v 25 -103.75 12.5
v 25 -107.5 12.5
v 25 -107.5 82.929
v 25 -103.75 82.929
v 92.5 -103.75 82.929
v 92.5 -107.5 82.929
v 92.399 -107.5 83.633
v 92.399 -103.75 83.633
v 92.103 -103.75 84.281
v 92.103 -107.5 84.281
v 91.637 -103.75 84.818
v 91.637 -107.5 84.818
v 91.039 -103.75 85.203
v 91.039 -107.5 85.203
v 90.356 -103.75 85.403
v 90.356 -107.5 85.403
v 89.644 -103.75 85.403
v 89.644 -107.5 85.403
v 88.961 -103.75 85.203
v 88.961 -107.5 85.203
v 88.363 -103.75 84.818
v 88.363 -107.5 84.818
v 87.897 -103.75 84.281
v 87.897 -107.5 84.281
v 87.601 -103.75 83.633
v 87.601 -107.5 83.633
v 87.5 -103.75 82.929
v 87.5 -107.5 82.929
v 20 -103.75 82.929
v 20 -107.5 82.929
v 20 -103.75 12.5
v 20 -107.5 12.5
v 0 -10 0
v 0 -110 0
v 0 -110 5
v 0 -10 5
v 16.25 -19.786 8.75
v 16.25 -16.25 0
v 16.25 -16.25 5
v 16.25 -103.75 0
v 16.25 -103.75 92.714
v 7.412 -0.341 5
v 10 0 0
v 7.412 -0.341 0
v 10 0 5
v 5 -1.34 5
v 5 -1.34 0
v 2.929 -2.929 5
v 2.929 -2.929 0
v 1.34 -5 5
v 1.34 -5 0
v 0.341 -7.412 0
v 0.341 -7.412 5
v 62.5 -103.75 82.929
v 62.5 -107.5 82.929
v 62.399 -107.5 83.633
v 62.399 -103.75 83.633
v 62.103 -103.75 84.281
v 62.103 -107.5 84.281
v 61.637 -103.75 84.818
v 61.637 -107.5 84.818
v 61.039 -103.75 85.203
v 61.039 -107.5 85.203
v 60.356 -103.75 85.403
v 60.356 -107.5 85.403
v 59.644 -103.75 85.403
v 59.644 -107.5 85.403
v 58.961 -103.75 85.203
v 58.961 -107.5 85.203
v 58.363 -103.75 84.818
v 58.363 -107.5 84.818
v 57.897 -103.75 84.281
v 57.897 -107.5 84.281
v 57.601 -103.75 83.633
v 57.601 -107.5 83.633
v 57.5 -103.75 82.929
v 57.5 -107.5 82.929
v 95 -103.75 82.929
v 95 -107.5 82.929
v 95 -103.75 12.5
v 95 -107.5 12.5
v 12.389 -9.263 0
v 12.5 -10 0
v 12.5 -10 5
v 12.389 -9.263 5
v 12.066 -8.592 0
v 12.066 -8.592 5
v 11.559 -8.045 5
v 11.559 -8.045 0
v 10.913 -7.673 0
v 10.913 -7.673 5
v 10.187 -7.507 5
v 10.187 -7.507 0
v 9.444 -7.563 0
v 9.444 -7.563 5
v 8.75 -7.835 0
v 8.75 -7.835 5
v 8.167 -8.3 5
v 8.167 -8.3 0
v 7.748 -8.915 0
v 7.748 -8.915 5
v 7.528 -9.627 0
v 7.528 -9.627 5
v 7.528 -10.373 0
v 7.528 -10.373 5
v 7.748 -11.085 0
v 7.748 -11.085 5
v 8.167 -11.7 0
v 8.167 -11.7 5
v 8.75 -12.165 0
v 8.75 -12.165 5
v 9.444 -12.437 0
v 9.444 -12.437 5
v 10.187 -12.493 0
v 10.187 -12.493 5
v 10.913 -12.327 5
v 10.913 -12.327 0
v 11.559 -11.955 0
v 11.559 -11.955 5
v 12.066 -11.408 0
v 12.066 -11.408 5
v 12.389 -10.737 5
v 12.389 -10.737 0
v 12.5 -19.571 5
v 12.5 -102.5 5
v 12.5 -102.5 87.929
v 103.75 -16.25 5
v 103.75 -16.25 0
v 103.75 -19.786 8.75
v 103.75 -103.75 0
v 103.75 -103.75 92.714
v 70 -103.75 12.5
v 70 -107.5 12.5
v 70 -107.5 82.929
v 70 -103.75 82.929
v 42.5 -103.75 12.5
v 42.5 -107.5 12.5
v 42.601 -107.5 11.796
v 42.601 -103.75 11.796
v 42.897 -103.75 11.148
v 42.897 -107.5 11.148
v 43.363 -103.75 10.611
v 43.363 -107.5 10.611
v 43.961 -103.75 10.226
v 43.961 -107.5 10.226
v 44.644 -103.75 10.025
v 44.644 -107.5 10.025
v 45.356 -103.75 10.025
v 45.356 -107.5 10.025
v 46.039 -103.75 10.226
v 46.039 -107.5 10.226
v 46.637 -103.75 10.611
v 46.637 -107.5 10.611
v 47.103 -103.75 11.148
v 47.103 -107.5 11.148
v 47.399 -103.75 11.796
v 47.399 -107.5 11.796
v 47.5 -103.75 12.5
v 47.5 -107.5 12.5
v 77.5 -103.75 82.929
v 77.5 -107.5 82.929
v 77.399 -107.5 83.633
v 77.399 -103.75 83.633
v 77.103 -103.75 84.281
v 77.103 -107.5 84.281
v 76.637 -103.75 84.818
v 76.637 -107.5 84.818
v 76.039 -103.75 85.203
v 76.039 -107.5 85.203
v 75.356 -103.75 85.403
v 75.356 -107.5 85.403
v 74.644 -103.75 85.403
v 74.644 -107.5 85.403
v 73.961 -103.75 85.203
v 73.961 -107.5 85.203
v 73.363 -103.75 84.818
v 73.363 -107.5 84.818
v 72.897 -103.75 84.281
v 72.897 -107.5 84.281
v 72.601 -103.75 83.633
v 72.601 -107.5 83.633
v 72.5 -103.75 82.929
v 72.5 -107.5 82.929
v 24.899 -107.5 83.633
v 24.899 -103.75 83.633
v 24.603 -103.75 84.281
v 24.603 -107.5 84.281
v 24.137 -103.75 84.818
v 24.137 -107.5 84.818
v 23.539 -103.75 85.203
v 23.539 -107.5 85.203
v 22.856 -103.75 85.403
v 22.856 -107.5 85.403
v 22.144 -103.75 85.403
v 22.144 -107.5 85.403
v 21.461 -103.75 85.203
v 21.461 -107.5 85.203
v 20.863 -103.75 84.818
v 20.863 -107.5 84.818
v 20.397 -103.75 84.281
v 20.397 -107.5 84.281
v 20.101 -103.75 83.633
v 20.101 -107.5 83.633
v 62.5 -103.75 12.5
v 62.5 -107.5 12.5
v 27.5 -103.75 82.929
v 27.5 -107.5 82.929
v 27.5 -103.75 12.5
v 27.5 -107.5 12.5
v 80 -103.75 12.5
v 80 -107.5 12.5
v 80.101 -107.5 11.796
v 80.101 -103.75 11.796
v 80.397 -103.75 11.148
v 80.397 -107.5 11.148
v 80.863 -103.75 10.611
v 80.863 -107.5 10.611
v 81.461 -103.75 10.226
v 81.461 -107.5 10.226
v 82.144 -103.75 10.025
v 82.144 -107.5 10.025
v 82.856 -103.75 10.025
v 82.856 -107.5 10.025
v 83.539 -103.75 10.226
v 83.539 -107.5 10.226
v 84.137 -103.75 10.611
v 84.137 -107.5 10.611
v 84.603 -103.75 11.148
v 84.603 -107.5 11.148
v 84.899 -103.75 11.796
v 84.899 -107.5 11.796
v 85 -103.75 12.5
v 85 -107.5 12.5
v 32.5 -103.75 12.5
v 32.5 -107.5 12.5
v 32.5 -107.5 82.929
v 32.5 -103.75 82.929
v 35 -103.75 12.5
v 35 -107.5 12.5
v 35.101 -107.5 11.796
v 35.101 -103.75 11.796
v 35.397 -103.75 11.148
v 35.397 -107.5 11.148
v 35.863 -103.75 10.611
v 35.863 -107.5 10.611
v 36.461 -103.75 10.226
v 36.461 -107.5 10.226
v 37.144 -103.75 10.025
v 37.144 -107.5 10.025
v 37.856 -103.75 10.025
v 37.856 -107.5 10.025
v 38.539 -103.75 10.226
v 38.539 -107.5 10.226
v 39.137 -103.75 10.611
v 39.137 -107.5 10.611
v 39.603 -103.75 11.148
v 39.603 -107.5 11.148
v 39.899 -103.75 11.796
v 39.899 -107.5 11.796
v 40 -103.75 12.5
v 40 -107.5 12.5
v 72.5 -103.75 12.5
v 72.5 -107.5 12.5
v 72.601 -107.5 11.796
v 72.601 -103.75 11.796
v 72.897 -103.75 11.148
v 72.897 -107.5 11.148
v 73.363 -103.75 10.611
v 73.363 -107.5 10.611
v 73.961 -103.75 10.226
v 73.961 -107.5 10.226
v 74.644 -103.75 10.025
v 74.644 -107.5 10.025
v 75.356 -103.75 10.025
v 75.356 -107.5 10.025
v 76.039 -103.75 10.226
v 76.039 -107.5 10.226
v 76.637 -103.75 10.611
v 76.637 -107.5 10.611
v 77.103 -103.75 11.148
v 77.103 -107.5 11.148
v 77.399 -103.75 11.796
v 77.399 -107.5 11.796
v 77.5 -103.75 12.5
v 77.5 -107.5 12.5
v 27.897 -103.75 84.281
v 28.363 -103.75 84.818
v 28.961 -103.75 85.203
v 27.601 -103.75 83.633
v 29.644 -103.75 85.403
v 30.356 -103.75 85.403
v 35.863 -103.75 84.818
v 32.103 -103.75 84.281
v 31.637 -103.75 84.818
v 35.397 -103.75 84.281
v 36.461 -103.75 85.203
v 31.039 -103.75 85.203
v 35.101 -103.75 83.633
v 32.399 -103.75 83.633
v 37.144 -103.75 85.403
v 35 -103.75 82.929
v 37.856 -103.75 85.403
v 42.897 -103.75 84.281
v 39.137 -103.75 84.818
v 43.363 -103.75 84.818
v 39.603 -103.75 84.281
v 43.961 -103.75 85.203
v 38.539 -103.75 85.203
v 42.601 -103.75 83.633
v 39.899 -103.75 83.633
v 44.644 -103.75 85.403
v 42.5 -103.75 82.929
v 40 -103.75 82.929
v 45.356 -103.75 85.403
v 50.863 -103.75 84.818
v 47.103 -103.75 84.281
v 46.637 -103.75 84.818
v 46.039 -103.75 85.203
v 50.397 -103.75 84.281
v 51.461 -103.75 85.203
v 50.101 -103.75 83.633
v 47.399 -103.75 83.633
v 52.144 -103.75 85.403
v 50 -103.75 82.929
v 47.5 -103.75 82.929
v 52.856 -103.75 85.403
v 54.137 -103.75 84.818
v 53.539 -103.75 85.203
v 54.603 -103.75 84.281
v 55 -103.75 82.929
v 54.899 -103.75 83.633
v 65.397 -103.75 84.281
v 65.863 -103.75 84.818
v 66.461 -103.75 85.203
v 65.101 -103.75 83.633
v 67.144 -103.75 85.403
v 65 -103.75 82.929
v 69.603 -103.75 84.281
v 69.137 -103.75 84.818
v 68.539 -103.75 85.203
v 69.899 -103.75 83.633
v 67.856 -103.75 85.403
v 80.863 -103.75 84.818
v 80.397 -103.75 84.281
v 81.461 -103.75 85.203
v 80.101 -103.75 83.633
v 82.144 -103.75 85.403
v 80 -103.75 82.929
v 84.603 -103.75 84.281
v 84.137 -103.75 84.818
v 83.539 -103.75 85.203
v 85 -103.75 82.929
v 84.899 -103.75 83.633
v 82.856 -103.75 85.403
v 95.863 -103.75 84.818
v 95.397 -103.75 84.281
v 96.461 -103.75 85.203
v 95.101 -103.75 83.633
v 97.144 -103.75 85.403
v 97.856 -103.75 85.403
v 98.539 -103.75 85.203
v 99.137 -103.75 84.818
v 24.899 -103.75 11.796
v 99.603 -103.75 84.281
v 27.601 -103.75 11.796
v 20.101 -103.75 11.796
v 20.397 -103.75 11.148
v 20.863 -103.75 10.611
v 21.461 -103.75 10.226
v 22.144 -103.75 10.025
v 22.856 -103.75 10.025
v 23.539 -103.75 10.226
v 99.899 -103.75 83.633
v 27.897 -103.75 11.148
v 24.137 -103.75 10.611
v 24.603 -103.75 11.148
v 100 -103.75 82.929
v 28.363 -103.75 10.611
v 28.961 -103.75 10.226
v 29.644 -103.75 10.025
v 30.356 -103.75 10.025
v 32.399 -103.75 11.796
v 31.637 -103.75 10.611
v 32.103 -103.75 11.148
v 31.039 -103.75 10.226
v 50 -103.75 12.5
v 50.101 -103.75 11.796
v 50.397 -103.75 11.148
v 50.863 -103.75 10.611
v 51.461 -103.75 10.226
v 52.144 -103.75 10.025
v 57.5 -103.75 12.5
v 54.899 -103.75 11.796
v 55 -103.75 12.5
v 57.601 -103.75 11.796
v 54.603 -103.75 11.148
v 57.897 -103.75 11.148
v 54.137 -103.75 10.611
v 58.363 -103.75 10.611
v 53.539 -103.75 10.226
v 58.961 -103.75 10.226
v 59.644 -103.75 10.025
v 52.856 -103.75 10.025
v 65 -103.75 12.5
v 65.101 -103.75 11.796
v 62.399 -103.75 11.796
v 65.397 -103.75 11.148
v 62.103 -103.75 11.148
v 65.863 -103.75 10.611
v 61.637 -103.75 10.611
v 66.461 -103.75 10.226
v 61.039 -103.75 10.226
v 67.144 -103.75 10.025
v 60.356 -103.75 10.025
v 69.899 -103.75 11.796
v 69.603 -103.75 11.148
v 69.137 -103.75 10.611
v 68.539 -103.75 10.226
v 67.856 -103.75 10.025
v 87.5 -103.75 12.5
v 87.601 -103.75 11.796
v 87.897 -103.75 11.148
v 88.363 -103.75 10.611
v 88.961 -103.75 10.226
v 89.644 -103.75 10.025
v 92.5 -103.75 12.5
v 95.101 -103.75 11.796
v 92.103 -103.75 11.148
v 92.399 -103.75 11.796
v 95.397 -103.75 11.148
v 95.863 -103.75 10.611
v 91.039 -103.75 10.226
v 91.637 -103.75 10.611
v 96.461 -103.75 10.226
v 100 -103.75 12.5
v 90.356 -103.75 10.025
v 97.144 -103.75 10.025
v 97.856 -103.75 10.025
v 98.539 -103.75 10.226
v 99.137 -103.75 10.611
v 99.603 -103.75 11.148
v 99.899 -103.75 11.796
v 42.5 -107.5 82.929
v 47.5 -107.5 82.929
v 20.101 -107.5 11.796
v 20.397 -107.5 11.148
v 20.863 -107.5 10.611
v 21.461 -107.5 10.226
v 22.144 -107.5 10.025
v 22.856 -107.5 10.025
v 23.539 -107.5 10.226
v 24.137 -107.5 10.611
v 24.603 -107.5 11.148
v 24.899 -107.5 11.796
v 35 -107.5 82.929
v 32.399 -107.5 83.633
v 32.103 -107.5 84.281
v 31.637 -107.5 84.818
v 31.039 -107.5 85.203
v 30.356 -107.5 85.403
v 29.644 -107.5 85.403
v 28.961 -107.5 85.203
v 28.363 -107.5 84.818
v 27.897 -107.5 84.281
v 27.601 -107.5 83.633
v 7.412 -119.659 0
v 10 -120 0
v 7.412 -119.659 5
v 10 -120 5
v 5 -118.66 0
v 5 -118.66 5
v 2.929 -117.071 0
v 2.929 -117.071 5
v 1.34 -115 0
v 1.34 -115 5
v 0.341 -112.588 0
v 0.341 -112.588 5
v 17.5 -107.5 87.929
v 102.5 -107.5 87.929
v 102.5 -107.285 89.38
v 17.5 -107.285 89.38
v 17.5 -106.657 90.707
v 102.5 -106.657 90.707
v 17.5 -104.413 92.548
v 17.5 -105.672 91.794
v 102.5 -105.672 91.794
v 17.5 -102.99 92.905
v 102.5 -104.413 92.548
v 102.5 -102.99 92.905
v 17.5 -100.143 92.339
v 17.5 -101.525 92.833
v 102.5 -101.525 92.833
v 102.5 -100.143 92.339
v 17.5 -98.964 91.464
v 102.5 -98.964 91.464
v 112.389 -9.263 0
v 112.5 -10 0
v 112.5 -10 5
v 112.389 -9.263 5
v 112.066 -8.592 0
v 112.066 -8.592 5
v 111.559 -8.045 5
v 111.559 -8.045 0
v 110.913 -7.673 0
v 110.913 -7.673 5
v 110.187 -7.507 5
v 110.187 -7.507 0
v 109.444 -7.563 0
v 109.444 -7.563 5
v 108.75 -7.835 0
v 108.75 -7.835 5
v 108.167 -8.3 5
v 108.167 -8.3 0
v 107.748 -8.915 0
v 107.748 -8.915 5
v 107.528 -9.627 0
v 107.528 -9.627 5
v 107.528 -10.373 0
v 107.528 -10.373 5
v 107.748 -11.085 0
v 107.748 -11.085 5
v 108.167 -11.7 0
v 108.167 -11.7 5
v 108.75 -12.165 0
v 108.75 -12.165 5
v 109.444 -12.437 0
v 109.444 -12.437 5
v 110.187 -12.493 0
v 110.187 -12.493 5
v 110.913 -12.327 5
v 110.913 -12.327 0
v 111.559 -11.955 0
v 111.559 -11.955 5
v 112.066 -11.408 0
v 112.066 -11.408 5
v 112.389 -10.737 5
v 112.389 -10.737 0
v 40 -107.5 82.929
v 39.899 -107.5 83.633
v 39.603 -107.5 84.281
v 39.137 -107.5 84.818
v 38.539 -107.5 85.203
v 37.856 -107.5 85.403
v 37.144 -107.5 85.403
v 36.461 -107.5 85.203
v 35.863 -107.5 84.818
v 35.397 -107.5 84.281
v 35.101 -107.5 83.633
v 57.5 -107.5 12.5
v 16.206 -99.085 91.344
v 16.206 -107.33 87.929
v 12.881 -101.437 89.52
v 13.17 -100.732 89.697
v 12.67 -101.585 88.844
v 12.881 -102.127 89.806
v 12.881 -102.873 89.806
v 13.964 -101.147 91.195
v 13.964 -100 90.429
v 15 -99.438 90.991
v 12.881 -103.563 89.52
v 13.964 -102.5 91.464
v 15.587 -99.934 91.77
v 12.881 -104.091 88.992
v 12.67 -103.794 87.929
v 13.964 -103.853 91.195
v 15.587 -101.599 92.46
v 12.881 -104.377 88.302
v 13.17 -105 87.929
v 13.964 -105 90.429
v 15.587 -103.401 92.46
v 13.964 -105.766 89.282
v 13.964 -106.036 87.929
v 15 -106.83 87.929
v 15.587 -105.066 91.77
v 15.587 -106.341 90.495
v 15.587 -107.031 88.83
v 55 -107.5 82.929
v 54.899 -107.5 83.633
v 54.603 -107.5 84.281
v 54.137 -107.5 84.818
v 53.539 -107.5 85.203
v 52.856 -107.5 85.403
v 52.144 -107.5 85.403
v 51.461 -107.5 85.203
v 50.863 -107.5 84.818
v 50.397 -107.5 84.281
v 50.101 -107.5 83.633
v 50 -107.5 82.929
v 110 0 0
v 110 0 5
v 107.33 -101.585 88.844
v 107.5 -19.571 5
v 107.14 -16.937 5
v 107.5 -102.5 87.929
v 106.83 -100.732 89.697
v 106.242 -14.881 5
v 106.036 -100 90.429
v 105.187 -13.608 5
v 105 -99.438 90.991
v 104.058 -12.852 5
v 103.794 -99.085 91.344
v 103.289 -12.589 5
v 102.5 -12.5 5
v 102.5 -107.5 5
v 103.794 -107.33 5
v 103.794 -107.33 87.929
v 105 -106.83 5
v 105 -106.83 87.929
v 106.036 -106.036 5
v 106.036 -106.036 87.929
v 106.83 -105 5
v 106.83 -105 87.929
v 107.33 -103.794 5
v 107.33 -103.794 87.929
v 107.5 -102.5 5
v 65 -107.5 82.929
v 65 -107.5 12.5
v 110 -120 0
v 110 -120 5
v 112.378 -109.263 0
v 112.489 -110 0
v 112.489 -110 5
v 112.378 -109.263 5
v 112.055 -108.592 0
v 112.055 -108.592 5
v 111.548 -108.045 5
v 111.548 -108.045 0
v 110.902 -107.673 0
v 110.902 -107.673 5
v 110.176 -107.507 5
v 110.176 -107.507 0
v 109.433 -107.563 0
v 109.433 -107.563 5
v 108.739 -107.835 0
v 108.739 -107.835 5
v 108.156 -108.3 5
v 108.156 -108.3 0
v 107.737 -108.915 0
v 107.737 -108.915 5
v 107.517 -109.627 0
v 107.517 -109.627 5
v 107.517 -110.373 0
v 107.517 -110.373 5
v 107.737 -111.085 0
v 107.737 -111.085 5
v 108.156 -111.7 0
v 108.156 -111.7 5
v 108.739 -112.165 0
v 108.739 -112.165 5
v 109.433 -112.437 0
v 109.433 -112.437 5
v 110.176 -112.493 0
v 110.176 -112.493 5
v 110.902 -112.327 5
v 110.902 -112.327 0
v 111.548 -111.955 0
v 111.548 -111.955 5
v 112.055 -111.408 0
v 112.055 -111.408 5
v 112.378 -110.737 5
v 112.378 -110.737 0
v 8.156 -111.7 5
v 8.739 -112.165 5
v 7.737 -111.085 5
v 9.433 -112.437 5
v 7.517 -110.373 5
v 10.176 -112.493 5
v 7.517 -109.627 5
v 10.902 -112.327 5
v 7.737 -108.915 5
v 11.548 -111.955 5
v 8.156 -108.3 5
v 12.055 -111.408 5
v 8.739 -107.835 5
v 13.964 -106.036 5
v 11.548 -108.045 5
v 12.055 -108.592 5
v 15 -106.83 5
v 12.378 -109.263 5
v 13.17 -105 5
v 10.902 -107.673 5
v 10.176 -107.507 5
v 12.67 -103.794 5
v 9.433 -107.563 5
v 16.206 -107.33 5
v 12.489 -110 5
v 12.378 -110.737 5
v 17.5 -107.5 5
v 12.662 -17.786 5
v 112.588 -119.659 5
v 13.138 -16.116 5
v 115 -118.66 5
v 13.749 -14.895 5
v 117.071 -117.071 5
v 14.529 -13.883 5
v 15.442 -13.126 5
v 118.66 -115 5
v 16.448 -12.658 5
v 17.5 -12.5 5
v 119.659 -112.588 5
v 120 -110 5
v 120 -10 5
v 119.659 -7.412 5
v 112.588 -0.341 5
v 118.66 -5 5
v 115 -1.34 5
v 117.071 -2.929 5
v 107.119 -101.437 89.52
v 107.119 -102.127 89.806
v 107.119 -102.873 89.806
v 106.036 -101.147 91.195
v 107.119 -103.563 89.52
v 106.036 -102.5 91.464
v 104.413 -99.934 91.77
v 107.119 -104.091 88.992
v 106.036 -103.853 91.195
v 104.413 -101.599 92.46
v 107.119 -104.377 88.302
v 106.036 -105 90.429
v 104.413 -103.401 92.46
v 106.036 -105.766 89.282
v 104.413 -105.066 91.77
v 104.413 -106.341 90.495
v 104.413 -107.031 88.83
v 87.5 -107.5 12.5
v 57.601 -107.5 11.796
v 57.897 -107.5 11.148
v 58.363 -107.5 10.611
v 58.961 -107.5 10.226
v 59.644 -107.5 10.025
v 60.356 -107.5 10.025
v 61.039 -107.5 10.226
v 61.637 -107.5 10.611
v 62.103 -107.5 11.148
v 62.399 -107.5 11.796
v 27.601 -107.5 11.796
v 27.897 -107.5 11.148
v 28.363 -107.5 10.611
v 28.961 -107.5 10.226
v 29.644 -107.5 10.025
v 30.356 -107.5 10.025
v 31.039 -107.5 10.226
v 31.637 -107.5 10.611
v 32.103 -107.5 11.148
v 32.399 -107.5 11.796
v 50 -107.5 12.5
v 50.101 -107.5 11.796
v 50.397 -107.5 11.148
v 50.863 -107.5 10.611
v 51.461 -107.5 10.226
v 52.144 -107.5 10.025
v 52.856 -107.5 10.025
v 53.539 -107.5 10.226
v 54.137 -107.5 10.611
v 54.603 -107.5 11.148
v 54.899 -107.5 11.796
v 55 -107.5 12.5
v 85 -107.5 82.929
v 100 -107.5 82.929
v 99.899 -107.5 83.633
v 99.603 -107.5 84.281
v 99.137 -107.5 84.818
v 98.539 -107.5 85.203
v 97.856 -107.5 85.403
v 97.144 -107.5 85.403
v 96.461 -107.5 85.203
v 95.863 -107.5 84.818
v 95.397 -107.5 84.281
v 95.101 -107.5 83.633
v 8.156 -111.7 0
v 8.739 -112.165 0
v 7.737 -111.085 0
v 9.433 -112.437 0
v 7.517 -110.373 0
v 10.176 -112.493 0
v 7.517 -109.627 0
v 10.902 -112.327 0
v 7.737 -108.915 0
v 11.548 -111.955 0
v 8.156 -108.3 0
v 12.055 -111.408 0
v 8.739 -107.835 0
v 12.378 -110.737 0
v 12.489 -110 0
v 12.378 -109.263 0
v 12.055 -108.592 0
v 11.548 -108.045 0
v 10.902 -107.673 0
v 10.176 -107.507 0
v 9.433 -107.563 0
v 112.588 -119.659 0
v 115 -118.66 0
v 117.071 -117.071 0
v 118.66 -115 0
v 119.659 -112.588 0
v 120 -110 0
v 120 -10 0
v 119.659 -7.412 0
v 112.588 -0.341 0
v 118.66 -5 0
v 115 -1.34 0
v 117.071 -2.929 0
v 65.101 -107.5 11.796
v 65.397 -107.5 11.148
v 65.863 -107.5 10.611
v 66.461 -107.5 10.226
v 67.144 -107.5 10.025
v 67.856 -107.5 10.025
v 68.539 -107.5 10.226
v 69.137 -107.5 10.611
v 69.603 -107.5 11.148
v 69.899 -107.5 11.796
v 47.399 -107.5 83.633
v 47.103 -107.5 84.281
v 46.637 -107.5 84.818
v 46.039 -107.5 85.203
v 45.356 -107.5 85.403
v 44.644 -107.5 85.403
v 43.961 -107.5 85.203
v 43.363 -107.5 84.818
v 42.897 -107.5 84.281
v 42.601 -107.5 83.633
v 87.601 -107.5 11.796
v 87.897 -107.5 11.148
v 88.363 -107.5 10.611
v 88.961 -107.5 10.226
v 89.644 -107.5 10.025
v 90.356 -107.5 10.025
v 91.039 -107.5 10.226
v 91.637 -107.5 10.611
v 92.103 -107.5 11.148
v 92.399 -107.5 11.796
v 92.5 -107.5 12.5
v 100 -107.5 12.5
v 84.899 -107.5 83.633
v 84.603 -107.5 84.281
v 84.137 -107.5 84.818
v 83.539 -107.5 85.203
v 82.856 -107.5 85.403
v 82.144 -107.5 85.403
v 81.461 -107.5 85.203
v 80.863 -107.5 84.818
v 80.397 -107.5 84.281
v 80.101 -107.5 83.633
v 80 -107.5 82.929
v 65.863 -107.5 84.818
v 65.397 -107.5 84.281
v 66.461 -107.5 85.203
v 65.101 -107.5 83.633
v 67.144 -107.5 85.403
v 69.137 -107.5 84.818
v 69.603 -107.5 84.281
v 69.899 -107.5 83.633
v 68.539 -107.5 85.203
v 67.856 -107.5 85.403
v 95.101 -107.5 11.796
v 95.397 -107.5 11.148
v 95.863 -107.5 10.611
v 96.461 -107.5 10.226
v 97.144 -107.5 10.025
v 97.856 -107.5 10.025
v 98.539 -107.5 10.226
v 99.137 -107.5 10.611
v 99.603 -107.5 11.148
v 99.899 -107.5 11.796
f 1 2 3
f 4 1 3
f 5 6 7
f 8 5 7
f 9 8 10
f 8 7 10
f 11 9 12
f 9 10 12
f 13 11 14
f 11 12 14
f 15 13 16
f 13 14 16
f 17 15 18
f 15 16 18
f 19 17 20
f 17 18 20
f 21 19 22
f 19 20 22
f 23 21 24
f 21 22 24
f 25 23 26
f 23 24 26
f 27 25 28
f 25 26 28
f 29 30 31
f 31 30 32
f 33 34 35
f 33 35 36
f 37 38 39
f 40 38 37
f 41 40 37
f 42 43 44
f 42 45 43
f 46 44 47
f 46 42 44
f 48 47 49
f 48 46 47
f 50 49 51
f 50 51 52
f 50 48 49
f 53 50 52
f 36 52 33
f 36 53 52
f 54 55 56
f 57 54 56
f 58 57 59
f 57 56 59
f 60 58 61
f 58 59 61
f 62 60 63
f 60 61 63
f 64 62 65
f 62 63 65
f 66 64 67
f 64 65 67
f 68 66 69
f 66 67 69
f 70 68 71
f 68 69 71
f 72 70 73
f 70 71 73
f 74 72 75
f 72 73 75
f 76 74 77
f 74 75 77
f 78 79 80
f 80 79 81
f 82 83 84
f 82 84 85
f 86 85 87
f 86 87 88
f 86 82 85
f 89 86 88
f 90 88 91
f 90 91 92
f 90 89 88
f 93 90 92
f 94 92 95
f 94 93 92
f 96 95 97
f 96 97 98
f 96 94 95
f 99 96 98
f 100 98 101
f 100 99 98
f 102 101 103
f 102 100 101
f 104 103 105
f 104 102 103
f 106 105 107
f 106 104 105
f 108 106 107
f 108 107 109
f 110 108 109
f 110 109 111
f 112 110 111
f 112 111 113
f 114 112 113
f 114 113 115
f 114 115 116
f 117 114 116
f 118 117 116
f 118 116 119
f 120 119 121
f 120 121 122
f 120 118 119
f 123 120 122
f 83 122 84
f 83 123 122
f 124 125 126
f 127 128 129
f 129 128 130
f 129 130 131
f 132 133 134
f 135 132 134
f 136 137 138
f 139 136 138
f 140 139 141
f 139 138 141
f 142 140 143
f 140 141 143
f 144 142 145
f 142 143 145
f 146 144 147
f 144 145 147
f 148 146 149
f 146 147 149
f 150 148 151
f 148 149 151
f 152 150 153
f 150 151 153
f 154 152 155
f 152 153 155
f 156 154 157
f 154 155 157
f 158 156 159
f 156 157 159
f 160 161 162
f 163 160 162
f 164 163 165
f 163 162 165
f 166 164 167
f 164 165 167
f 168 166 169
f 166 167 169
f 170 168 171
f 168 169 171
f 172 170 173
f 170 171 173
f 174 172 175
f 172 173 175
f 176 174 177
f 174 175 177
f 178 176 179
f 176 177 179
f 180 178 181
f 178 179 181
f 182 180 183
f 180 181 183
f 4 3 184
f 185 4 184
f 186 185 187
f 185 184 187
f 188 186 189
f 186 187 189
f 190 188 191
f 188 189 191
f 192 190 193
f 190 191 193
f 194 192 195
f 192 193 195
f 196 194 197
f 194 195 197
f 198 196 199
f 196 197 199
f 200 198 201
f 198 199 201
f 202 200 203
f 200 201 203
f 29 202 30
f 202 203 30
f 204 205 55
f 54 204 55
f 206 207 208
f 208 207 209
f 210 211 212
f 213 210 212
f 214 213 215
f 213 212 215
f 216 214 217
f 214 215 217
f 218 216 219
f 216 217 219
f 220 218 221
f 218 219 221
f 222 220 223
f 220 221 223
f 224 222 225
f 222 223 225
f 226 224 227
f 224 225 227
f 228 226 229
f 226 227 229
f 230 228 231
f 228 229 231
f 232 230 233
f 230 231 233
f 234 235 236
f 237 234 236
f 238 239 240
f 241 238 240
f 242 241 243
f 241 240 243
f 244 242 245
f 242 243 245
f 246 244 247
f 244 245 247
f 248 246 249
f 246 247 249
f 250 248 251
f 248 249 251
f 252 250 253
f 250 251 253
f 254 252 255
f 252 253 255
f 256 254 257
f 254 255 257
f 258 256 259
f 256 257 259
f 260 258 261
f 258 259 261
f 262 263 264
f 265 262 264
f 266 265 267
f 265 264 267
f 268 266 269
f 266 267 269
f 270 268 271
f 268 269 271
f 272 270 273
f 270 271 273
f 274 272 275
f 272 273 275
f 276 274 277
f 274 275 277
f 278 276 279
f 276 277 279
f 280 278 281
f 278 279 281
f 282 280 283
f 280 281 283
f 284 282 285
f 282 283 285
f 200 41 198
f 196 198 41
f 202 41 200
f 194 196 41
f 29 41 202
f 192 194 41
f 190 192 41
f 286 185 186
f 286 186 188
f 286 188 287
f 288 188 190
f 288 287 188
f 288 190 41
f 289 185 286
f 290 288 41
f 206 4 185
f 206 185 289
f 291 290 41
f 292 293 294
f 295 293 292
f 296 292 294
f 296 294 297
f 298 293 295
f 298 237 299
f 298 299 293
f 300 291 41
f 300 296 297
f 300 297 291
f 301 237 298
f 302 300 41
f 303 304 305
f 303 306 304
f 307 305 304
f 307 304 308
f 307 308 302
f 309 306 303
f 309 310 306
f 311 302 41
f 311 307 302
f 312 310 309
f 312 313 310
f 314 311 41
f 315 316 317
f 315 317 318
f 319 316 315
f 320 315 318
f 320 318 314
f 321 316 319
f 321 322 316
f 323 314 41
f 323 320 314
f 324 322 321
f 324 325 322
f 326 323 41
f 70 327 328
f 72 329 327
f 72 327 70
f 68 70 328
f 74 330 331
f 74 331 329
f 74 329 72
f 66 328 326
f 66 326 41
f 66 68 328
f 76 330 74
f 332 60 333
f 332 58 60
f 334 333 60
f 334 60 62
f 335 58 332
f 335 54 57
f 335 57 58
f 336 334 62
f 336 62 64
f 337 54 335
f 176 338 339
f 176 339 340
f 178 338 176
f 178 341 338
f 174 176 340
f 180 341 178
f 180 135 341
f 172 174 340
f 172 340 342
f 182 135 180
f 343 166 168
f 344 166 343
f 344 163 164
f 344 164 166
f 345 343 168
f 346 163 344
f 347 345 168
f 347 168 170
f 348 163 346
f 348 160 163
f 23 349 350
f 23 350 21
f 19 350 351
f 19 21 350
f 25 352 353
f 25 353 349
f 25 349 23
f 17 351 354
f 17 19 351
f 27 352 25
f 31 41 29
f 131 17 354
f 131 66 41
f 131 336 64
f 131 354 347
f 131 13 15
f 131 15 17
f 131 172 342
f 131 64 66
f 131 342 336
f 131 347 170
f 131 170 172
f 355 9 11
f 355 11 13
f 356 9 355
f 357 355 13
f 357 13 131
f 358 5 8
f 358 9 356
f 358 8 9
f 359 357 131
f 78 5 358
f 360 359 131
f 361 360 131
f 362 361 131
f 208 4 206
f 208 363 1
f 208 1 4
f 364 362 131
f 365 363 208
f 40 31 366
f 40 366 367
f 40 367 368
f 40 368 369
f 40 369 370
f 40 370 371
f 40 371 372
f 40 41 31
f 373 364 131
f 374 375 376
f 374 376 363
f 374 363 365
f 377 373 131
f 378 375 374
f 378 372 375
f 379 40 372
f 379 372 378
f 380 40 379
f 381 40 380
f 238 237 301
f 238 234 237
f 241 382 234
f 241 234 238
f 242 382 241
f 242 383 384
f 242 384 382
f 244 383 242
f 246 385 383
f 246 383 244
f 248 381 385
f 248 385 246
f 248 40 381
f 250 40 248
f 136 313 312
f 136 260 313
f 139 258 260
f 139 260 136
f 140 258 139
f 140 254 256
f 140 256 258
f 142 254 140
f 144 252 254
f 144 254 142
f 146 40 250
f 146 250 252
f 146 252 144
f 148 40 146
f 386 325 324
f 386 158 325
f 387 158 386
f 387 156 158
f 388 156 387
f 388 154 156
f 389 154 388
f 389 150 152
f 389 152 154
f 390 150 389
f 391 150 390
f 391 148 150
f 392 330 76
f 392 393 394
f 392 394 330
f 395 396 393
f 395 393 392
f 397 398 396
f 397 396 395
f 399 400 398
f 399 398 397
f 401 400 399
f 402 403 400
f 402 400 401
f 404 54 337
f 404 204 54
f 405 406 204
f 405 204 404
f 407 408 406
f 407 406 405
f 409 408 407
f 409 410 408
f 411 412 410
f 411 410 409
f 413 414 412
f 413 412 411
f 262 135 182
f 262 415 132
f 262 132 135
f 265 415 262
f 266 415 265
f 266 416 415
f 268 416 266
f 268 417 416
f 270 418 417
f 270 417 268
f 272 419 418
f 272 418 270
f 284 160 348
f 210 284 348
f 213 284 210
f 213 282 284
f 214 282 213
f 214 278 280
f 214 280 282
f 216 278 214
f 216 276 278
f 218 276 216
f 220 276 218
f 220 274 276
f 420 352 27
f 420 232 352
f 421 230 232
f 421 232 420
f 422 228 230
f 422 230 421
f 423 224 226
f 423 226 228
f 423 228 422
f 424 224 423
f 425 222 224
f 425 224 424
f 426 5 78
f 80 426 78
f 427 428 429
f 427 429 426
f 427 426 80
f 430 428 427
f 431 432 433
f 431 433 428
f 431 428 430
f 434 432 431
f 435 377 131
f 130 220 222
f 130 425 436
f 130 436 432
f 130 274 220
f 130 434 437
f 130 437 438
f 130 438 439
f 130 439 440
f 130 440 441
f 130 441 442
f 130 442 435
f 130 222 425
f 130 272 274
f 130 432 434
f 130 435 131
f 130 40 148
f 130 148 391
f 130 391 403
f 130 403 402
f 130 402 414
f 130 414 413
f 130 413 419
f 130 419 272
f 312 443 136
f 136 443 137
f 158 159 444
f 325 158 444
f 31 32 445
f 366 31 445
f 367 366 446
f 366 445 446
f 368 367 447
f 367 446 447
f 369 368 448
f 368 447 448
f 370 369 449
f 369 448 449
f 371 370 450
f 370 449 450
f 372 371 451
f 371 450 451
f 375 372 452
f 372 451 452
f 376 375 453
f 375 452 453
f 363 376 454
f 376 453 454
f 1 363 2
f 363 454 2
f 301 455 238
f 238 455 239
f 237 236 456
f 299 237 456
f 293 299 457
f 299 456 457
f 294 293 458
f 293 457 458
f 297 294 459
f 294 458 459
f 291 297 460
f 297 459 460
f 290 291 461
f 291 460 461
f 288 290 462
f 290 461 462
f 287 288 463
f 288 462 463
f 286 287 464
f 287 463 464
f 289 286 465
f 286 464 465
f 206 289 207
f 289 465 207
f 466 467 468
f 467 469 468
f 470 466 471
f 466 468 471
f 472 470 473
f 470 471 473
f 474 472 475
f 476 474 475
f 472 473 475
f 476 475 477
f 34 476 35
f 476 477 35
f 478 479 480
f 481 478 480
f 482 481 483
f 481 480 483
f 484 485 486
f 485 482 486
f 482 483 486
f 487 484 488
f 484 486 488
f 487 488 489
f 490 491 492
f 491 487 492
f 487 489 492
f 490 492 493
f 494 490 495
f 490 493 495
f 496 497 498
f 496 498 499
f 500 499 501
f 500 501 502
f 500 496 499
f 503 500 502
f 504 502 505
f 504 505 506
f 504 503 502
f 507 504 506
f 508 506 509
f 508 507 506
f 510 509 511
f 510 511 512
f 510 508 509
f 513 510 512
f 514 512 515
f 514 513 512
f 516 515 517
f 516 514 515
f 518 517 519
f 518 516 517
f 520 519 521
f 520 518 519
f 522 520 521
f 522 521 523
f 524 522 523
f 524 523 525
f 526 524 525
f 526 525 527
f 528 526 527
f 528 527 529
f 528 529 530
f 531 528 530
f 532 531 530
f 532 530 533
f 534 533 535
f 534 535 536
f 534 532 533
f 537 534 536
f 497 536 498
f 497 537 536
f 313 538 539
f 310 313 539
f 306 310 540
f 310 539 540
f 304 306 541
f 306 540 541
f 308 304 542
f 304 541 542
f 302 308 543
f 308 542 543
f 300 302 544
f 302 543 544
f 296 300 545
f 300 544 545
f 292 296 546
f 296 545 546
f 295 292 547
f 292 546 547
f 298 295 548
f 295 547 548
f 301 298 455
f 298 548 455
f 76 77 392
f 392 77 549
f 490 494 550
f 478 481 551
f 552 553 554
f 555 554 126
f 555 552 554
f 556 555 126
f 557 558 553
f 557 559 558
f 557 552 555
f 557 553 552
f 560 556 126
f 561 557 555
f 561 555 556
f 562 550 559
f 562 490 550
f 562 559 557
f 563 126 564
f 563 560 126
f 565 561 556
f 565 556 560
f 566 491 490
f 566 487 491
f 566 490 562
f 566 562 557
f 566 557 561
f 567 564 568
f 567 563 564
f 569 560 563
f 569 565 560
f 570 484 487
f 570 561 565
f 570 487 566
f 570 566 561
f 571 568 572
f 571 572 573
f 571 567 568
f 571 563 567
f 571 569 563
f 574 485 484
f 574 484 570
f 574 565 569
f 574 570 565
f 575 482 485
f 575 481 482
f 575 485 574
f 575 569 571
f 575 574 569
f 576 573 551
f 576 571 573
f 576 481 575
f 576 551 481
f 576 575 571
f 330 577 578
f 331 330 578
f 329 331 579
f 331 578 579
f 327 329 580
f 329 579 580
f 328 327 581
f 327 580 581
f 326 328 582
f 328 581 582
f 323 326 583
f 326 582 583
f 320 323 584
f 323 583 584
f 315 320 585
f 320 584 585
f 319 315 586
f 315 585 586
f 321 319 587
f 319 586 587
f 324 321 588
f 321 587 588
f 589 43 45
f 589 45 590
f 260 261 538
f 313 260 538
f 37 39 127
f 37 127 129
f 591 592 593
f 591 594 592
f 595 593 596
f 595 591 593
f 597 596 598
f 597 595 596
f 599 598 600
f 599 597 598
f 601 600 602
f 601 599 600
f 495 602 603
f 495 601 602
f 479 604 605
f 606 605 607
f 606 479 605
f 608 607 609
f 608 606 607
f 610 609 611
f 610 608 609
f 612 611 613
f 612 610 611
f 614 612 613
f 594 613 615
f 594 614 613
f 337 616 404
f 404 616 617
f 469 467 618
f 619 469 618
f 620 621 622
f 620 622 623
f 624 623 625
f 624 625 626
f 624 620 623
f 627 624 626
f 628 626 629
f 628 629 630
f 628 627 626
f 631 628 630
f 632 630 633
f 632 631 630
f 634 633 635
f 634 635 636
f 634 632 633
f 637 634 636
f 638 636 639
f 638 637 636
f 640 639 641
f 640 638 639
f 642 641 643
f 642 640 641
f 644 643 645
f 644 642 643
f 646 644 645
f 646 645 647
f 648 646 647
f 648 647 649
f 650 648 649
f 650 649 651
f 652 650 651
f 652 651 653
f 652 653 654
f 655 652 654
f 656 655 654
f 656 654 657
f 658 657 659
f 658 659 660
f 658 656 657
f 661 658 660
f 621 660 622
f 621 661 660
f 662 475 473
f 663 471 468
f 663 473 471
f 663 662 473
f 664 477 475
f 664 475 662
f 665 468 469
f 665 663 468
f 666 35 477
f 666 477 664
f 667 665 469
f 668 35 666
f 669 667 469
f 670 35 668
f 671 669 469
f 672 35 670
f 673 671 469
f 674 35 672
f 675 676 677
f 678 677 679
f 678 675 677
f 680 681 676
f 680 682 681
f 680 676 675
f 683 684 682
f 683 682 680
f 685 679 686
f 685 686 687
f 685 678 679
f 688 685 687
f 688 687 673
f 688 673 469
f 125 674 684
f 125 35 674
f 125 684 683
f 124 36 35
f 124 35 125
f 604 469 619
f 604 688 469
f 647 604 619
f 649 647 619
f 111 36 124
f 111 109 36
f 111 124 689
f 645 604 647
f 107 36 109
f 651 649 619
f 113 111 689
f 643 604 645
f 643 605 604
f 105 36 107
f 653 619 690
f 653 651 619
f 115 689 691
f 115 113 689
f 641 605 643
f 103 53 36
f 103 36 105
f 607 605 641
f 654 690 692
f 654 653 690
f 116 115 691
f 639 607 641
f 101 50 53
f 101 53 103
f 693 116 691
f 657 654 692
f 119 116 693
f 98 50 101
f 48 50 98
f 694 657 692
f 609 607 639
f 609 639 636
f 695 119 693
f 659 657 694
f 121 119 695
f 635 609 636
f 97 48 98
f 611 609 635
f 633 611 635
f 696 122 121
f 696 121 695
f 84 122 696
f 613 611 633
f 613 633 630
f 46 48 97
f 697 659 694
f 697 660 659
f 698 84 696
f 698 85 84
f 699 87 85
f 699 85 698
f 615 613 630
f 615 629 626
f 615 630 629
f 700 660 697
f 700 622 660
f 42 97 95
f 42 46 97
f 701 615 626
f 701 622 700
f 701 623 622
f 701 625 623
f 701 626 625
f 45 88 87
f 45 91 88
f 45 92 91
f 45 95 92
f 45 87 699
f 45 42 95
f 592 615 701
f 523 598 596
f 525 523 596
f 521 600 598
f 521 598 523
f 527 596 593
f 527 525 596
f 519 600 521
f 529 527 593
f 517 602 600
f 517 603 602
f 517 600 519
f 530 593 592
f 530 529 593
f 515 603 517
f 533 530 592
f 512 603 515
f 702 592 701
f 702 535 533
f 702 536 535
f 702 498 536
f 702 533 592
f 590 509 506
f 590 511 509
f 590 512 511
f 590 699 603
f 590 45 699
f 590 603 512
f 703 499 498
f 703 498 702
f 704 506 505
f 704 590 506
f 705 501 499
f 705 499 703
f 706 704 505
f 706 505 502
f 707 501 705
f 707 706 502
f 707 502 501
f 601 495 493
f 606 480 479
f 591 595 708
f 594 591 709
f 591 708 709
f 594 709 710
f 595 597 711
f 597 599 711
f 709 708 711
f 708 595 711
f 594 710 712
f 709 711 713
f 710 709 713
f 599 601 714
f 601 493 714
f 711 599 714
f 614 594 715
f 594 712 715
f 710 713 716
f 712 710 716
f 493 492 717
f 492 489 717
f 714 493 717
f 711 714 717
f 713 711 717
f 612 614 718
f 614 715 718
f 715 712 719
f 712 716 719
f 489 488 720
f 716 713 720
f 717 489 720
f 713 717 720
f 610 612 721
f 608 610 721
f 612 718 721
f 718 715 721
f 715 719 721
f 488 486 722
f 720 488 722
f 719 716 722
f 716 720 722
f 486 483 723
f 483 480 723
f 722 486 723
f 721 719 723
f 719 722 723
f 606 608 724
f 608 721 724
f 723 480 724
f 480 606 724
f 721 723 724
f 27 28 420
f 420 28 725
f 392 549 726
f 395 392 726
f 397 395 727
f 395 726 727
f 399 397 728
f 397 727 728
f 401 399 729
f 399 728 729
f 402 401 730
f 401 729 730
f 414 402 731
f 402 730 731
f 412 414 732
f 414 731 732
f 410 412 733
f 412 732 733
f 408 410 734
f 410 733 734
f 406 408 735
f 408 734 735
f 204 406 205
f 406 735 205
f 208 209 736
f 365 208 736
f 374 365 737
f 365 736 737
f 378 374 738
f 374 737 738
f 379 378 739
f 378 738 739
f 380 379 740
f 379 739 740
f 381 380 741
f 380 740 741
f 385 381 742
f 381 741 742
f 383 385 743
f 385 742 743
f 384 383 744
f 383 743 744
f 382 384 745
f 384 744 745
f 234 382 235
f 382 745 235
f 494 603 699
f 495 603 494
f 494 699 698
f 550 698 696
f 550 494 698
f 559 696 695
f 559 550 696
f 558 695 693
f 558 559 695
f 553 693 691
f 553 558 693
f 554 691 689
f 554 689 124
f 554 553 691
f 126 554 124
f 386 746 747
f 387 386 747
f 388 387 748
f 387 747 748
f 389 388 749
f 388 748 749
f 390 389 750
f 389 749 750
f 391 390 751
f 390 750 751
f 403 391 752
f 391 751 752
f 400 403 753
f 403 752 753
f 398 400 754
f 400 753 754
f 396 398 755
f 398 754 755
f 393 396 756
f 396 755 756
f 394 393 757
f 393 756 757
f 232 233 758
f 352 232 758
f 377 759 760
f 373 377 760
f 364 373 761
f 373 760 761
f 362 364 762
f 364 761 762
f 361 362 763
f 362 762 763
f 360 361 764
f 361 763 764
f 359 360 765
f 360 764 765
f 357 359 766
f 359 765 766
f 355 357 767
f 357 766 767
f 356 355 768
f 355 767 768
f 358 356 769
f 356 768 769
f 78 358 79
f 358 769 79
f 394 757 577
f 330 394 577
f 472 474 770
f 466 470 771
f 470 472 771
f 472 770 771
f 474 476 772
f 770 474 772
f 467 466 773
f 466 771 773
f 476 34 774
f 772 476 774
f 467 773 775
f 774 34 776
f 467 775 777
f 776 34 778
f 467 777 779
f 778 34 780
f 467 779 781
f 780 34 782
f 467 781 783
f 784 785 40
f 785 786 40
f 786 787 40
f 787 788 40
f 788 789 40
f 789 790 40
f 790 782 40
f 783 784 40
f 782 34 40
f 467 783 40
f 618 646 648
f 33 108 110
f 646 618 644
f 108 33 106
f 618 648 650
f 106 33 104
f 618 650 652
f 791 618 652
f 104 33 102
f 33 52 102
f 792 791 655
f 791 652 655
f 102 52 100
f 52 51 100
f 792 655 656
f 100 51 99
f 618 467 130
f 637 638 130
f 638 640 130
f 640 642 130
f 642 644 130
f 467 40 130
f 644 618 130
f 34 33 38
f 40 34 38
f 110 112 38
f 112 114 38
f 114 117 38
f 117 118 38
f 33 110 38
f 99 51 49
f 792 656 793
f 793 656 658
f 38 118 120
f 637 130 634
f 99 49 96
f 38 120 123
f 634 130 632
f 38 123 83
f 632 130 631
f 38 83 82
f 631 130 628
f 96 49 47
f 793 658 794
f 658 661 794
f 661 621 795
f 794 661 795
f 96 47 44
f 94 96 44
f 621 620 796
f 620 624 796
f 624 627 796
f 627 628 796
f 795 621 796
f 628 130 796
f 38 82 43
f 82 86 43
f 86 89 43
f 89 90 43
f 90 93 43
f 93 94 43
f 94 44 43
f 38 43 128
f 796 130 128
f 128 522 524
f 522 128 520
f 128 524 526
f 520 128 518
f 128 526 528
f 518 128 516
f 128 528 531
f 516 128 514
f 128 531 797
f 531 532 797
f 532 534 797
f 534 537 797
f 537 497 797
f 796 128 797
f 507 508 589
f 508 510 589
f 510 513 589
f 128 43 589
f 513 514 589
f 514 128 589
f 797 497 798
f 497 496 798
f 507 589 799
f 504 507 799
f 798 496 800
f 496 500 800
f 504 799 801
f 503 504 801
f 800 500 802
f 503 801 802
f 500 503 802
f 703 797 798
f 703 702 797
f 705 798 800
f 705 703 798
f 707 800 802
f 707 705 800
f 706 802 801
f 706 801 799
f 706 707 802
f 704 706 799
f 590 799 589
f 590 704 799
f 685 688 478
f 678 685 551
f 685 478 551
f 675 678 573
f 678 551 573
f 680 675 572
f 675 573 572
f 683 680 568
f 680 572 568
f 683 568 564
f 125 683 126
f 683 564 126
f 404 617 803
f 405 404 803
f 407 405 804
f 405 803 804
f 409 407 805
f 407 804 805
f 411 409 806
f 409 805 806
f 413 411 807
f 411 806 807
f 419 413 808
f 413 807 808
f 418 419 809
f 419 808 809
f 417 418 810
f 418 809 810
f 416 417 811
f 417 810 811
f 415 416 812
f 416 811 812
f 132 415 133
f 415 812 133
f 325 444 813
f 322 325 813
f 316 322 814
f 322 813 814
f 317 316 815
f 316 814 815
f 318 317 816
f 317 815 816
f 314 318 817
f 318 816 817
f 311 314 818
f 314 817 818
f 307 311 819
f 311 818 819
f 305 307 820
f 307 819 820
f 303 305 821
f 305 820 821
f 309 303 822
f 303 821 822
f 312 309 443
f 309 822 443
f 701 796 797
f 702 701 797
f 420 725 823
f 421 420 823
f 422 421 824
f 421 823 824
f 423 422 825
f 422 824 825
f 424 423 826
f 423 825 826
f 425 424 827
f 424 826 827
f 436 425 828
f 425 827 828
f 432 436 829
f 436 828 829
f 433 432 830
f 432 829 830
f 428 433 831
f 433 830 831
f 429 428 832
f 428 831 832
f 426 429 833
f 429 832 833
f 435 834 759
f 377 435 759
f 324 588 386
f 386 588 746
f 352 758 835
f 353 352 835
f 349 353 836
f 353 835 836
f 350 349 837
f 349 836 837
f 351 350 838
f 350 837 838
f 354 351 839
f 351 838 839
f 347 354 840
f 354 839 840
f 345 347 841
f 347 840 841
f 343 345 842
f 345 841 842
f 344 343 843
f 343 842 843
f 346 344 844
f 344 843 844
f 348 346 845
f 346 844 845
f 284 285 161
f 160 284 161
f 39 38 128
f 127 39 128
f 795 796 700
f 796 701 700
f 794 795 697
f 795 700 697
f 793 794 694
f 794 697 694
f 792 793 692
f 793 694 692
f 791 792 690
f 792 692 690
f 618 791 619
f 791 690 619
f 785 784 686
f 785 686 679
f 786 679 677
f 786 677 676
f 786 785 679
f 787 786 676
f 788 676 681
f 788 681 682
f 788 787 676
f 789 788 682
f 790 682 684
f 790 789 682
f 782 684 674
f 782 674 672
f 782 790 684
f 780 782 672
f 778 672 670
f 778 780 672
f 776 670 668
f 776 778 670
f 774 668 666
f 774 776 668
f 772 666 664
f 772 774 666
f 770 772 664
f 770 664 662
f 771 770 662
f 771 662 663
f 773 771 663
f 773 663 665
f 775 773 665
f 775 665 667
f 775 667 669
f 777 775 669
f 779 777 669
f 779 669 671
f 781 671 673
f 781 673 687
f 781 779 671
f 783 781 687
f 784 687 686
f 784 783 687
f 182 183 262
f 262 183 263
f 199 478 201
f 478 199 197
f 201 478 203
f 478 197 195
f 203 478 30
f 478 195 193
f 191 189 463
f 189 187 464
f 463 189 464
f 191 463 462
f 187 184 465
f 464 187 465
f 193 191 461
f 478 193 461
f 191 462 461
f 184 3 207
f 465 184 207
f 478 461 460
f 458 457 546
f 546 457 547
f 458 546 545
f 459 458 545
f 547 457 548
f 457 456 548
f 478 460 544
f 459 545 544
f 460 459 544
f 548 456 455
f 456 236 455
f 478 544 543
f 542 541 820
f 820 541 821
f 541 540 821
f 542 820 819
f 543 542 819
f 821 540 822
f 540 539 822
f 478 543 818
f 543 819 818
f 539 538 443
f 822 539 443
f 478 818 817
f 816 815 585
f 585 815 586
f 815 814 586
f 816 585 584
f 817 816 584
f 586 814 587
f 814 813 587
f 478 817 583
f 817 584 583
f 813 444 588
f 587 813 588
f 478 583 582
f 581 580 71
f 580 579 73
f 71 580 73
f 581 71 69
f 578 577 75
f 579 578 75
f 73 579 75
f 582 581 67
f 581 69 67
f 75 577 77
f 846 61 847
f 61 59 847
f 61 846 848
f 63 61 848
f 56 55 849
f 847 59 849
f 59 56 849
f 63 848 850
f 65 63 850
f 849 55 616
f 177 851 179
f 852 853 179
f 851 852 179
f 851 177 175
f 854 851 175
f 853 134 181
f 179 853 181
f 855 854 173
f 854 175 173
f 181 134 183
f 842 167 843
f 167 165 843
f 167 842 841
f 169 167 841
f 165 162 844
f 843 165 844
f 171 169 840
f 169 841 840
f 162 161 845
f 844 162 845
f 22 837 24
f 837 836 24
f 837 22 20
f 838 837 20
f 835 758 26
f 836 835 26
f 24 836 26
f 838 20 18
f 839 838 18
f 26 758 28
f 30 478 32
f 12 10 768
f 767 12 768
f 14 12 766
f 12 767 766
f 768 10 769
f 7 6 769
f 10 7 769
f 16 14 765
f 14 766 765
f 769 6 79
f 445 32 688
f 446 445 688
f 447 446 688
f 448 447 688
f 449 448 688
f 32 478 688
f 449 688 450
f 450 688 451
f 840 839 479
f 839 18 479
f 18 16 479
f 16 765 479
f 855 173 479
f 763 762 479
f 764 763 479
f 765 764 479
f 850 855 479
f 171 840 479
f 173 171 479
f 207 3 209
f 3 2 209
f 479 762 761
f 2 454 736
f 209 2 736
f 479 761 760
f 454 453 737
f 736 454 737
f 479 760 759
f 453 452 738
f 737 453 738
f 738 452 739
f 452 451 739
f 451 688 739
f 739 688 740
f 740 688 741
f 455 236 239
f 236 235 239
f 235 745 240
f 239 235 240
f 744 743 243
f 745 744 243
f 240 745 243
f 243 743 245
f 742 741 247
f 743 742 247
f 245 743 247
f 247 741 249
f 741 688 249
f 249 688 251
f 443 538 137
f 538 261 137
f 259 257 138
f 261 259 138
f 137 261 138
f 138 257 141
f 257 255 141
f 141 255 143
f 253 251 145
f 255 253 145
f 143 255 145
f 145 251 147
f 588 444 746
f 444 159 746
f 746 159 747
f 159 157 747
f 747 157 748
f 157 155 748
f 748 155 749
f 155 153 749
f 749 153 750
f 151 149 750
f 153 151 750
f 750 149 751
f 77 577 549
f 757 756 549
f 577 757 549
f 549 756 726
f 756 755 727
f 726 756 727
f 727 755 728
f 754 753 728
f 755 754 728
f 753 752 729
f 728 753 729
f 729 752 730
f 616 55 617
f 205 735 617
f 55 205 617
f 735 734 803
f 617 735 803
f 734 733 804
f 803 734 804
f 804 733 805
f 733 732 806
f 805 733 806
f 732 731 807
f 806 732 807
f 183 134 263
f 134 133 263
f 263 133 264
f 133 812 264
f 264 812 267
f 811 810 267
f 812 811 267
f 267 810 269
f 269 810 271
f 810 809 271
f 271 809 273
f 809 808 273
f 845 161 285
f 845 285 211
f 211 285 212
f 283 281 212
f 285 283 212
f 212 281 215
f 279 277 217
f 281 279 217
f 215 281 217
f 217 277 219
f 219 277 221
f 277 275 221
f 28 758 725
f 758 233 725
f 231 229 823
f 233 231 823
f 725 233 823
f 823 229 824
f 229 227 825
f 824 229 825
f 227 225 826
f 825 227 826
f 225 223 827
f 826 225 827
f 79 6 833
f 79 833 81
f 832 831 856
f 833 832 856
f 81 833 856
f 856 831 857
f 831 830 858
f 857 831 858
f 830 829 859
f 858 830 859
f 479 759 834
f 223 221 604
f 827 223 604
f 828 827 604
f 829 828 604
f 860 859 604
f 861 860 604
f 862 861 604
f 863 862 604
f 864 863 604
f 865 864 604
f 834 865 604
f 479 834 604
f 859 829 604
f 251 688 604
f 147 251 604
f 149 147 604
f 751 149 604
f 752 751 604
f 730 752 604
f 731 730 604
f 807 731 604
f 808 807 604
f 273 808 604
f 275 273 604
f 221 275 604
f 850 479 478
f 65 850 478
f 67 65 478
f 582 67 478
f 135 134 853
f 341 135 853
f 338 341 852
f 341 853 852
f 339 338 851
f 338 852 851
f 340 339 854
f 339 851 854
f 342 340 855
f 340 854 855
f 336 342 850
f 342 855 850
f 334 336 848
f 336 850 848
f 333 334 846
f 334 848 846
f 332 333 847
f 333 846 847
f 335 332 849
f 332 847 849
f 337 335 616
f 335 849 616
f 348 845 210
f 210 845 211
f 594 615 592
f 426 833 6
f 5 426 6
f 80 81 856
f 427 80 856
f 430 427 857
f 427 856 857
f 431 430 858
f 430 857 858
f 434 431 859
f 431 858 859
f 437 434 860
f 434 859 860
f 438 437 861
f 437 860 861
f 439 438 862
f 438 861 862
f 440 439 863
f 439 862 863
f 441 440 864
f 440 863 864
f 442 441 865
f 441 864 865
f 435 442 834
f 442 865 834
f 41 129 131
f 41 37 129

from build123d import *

# Parameters (mm, degrees)
SKETCH2_W           = 120
SKETCH2_H           = 120
SKETCH2_R           = 2.5
SKETCH2_W_2         = 87.5
SKETCH2_H_2         = 87.5
BOSS_EXTRUDE1_DEPTH = 5
SKETCH3_W           = 95
SKETCH3_H           = 95
BOSS_EXTRUDE2_DEPTH = 95
CUT_EXTRUDE1_DEPTH  = 95
CUT_EXTRUDE4_REACH  = 191.621
SKETCH5_W           = 87.5
SKETCH5_H           = 87.5
CUT_EXTRUDE5_REACH  = 196.487
SKETCH9_W           = 87.5
SKETCH9_H           = 83.964466094
CUT_EXTRUDE7_DEPTH  = 87.5
BOSS_EXTRUDE3_REACH = 194.683
SKETCH11_W          = 87.5
SKETCH11_H          = 3.75
FILLET1_R           = 10
FILLET2_R           = 5
CUT_EXTRUDE9_DEPTH  = 5.5


with BuildPart() as part:
    # Sketch2 → Boss-Extrude1 (new body)
    with BuildSketch(Plane.XY):
        with Locations((60, -60)):
            Rectangle(SKETCH2_W, SKETCH2_H)
        with Locations((10, -10.00000061)):
            Circle(SKETCH2_R, mode=Mode.SUBTRACT)
        with Locations((110, -10)):
            Circle(SKETCH2_R, mode=Mode.SUBTRACT)
        with Locations((9.988952602, -110)):
            Circle(SKETCH2_R, mode=Mode.SUBTRACT)
        with Locations((109.988952602, -110)):
            Circle(SKETCH2_R, mode=Mode.SUBTRACT)
        with Locations((60, -60)):
            Rectangle(SKETCH2_W_2, SKETCH2_H_2, mode=Mode.SUBTRACT)
    extrude(amount=BOSS_EXTRUDE1_DEPTH)

    # Sketch3 → Boss-Extrude2 (add)
    with BuildSketch(Plane.XY.offset(5)):
        with Locations((60, -60)):
            Rectangle(SKETCH3_W, SKETCH3_H)
    extrude(amount=BOSS_EXTRUDE2_DEPTH)

    # Sketch4 → Cut-Extrude1 (cut)
    with BuildSketch(Plane(origin=(107.5, 0, 0), x_dir=(0, 0, -1), z_dir=(1, 0, 0))):
        Polygon((-5, -12.5), (-100, -107.5), (-100, -12.5), align=None)
    extrude(amount=-CUT_EXTRUDE1_DEPTH, mode=Mode.SUBTRACT)

    # Cut-Extrude4: up to this plane
    cut_extrude4_end = Plane(origin=(12.5, -14.267766953, 3.232233047), z_dir=(0, -0.7071067811865476, -0.7071067811865476))
    # Sketch5 → Cut-Extrude4 (cut, up to the surface)
    with BuildSketch(Plane.XZ.offset(107.5), mode=Mode.PRIVATE) as cut_extrude4_sk1:
        with Locations((60, 52.5)):
            Rectangle(SKETCH5_W, SKETCH5_H)
    cut_extrude4_tool1 = split(extrude(cut_extrude4_sk1.sketch, amount=-CUT_EXTRUDE4_REACH, mode=Mode.PRIVATE), bisect_by=cut_extrude4_end, keep=Keep.BOTH, mode=Mode.PRIVATE)
    add(cut_extrude4_tool1.solids().sort_by_distance((60, -107.5, 52.5))[0], mode=Mode.SUBTRACT)

    # Cut-Extrude5: up to this plane
    cut_extrude5_end = Plane(origin=(12.5, -14.267766953, 3.232233047), z_dir=(0, -0.7071067811865476, -0.7071067811865476))
    # Sketch9 → Cut-Extrude5 (cut, up to the surface)
    with BuildSketch(Plane(origin=(0, 0, 5), x_dir=(-1, 0, 0), z_dir=(0, 0, -1)), mode=Mode.PRIVATE) as cut_extrude5_sk1:
        with Locations((-60, -61.767766953)):
            Rectangle(SKETCH9_W, SKETCH9_H)
    cut_extrude5_tool1 = split(extrude(cut_extrude5_sk1.sketch, amount=-CUT_EXTRUDE5_REACH, mode=Mode.PRIVATE), bisect_by=cut_extrude5_end, keep=Keep.BOTH, mode=Mode.PRIVATE)
    add(cut_extrude5_tool1.solids().sort_by_distance((60, -61.767767, 5))[0], mode=Mode.SUBTRACT)

    # Sketch10 → Cut-Extrude7 (cut)
    with BuildSketch(Plane.ZY.offset(-103.75)):
        Polygon((8.75, -19.785533906), (5, -19.785533906), (5, -16.25), align=None)
    extrude(amount=CUT_EXTRUDE7_DEPTH, mode=Mode.SUBTRACT)

    # Sketch11 → Boss-Extrude3 (add, up to next)
    with BuildSketch(Plane.XY.offset(8.75), mode=Mode.PRIVATE) as boss_extrude3_sk1:
        with Locations((60, -105.625)):
            Rectangle(SKETCH11_W, SKETCH11_H)
    boss_extrude3_tool1 = extrude(boss_extrude3_sk1.sketch, amount=BOSS_EXTRUDE3_REACH, mode=Mode.PRIVATE) - part.part
    add(boss_extrude3_tool1.solids().sort_by_distance((60, -105.625, 8.75))[0])

    # Fillet1
    fillet1_edges = [part.edges().sort_by_distance(p)[0] for p in [
        (0, 0, 2.5),
        (120, 0, 2.5),
        (120, -120, 2.5),
        (0, -120, 2.5),
    ]]
    fillet(fillet1_edges, radius=FILLET1_R)

    # Fillet2
    fillet2_edges = [part.edges().sort_by_distance(p)[0] for p in [
        (12.5, -107.5, 52.5),
        (107.5, -107.5, 52.5),
        (60, -107.5, 100),
        (12.5, -60, 52.5),
        (107.5, -60, 52.5),
    ]]
    fillet(fillet2_edges, radius=FILLET2_R)

    # Sketch16 → Cut-Extrude9 (cut)
    with BuildSketch(Plane.XZ.offset(107.5)):
        with BuildLine():
            Line((20, 82.928932188), (20, 12.5))
            ThreePointArc((20, 12.5), (22.5, 10), (25, 12.5))
            Line((25, 12.5), (25, 82.928932188))
            ThreePointArc((25, 82.928932188), (22.5, 85.428932188), (20, 82.928932188))
        make_face()
        with BuildLine():
            Line((27.5, 82.928932188), (27.5, 12.5))
            ThreePointArc((27.5, 12.5), (30, 10), (32.5, 12.5))
            Line((32.5, 12.5), (32.5, 82.928932188))
            ThreePointArc((32.5, 82.928932188), (30, 85.428932188), (27.5, 82.928932188))
        make_face()
        with BuildLine():
            Line((35, 82.928932188), (35, 12.5))
            ThreePointArc((35, 12.5), (37.5, 10), (40, 12.5))
            Line((40, 12.5), (40, 82.928932188))
            ThreePointArc((40, 82.928932188), (37.5, 85.428932188), (35, 82.928932188))
        make_face()
        with BuildLine():
            Line((42.5, 82.928932188), (42.5, 12.5))
            ThreePointArc((42.5, 12.5), (45, 10), (47.5, 12.5))
            Line((47.5, 12.5), (47.5, 82.928932188))
            ThreePointArc((47.5, 82.928932188), (45, 85.428932188), (42.5, 82.928932188))
        make_face()
        with BuildLine():
            Line((50, 82.928932188), (50, 12.5))
            ThreePointArc((50, 12.5), (52.5, 10), (55, 12.5))
            Line((55, 12.5), (55, 82.928932188))
            ThreePointArc((55, 82.928932188), (52.5, 85.428932188), (50, 82.928932188))
        make_face()
        with BuildLine():
            Line((57.5, 82.928932188), (57.5, 12.5))
            ThreePointArc((57.5, 12.5), (60, 10), (62.5, 12.5))
            Line((62.5, 12.5), (62.5, 82.928932188))
            ThreePointArc((62.5, 82.928932188), (60, 85.428932188), (57.5, 82.928932188))
        make_face()
        with BuildLine():
            Line((65, 82.928932188), (65, 12.5))
            ThreePointArc((65, 12.5), (67.5, 10), (70, 12.5))
            Line((70, 12.5), (70, 82.928932188))
            ThreePointArc((70, 82.928932188), (67.5, 85.428932188), (65, 82.928932188))
        make_face()
        with BuildLine():
            Line((72.5, 82.928932188), (72.5, 12.5))
            ThreePointArc((72.5, 12.5), (75, 10), (77.5, 12.5))
            Line((77.5, 12.5), (77.5, 82.928932188))
            ThreePointArc((77.5, 82.928932188), (75, 85.428932188), (72.5, 82.928932188))
        make_face()
        with BuildLine():
            Line((80, 82.928932188), (80, 12.5))
            ThreePointArc((80, 12.5), (82.5, 10), (85, 12.5))
            Line((85, 12.5), (85, 82.928932188))
            ThreePointArc((85, 82.928932188), (82.5, 85.428932188), (80, 82.928932188))
        make_face()
        with BuildLine():
            Line((87.5, 82.928932188), (87.5, 12.5))
            ThreePointArc((87.5, 12.5), (90, 10), (92.5, 12.5))
            Line((92.5, 12.5), (92.5, 82.928932188))
            ThreePointArc((92.5, 82.928932188), (90, 85.428932188), (87.5, 82.928932188))
        make_face()
        with BuildLine():
            Line((95, 82.928932188), (95, 12.5))
            ThreePointArc((95, 12.5), (97.5, 10), (100, 12.5))
            Line((100, 12.5), (100, 82.928932188))
            ThreePointArc((100, 82.928932188), (97.5, 85.428932188), (95, 82.928932188))
        make_face()
    extrude(amount=-CUT_EXTRUDE9_DEPTH, mode=Mode.SUBTRACT)


solid = part.part
